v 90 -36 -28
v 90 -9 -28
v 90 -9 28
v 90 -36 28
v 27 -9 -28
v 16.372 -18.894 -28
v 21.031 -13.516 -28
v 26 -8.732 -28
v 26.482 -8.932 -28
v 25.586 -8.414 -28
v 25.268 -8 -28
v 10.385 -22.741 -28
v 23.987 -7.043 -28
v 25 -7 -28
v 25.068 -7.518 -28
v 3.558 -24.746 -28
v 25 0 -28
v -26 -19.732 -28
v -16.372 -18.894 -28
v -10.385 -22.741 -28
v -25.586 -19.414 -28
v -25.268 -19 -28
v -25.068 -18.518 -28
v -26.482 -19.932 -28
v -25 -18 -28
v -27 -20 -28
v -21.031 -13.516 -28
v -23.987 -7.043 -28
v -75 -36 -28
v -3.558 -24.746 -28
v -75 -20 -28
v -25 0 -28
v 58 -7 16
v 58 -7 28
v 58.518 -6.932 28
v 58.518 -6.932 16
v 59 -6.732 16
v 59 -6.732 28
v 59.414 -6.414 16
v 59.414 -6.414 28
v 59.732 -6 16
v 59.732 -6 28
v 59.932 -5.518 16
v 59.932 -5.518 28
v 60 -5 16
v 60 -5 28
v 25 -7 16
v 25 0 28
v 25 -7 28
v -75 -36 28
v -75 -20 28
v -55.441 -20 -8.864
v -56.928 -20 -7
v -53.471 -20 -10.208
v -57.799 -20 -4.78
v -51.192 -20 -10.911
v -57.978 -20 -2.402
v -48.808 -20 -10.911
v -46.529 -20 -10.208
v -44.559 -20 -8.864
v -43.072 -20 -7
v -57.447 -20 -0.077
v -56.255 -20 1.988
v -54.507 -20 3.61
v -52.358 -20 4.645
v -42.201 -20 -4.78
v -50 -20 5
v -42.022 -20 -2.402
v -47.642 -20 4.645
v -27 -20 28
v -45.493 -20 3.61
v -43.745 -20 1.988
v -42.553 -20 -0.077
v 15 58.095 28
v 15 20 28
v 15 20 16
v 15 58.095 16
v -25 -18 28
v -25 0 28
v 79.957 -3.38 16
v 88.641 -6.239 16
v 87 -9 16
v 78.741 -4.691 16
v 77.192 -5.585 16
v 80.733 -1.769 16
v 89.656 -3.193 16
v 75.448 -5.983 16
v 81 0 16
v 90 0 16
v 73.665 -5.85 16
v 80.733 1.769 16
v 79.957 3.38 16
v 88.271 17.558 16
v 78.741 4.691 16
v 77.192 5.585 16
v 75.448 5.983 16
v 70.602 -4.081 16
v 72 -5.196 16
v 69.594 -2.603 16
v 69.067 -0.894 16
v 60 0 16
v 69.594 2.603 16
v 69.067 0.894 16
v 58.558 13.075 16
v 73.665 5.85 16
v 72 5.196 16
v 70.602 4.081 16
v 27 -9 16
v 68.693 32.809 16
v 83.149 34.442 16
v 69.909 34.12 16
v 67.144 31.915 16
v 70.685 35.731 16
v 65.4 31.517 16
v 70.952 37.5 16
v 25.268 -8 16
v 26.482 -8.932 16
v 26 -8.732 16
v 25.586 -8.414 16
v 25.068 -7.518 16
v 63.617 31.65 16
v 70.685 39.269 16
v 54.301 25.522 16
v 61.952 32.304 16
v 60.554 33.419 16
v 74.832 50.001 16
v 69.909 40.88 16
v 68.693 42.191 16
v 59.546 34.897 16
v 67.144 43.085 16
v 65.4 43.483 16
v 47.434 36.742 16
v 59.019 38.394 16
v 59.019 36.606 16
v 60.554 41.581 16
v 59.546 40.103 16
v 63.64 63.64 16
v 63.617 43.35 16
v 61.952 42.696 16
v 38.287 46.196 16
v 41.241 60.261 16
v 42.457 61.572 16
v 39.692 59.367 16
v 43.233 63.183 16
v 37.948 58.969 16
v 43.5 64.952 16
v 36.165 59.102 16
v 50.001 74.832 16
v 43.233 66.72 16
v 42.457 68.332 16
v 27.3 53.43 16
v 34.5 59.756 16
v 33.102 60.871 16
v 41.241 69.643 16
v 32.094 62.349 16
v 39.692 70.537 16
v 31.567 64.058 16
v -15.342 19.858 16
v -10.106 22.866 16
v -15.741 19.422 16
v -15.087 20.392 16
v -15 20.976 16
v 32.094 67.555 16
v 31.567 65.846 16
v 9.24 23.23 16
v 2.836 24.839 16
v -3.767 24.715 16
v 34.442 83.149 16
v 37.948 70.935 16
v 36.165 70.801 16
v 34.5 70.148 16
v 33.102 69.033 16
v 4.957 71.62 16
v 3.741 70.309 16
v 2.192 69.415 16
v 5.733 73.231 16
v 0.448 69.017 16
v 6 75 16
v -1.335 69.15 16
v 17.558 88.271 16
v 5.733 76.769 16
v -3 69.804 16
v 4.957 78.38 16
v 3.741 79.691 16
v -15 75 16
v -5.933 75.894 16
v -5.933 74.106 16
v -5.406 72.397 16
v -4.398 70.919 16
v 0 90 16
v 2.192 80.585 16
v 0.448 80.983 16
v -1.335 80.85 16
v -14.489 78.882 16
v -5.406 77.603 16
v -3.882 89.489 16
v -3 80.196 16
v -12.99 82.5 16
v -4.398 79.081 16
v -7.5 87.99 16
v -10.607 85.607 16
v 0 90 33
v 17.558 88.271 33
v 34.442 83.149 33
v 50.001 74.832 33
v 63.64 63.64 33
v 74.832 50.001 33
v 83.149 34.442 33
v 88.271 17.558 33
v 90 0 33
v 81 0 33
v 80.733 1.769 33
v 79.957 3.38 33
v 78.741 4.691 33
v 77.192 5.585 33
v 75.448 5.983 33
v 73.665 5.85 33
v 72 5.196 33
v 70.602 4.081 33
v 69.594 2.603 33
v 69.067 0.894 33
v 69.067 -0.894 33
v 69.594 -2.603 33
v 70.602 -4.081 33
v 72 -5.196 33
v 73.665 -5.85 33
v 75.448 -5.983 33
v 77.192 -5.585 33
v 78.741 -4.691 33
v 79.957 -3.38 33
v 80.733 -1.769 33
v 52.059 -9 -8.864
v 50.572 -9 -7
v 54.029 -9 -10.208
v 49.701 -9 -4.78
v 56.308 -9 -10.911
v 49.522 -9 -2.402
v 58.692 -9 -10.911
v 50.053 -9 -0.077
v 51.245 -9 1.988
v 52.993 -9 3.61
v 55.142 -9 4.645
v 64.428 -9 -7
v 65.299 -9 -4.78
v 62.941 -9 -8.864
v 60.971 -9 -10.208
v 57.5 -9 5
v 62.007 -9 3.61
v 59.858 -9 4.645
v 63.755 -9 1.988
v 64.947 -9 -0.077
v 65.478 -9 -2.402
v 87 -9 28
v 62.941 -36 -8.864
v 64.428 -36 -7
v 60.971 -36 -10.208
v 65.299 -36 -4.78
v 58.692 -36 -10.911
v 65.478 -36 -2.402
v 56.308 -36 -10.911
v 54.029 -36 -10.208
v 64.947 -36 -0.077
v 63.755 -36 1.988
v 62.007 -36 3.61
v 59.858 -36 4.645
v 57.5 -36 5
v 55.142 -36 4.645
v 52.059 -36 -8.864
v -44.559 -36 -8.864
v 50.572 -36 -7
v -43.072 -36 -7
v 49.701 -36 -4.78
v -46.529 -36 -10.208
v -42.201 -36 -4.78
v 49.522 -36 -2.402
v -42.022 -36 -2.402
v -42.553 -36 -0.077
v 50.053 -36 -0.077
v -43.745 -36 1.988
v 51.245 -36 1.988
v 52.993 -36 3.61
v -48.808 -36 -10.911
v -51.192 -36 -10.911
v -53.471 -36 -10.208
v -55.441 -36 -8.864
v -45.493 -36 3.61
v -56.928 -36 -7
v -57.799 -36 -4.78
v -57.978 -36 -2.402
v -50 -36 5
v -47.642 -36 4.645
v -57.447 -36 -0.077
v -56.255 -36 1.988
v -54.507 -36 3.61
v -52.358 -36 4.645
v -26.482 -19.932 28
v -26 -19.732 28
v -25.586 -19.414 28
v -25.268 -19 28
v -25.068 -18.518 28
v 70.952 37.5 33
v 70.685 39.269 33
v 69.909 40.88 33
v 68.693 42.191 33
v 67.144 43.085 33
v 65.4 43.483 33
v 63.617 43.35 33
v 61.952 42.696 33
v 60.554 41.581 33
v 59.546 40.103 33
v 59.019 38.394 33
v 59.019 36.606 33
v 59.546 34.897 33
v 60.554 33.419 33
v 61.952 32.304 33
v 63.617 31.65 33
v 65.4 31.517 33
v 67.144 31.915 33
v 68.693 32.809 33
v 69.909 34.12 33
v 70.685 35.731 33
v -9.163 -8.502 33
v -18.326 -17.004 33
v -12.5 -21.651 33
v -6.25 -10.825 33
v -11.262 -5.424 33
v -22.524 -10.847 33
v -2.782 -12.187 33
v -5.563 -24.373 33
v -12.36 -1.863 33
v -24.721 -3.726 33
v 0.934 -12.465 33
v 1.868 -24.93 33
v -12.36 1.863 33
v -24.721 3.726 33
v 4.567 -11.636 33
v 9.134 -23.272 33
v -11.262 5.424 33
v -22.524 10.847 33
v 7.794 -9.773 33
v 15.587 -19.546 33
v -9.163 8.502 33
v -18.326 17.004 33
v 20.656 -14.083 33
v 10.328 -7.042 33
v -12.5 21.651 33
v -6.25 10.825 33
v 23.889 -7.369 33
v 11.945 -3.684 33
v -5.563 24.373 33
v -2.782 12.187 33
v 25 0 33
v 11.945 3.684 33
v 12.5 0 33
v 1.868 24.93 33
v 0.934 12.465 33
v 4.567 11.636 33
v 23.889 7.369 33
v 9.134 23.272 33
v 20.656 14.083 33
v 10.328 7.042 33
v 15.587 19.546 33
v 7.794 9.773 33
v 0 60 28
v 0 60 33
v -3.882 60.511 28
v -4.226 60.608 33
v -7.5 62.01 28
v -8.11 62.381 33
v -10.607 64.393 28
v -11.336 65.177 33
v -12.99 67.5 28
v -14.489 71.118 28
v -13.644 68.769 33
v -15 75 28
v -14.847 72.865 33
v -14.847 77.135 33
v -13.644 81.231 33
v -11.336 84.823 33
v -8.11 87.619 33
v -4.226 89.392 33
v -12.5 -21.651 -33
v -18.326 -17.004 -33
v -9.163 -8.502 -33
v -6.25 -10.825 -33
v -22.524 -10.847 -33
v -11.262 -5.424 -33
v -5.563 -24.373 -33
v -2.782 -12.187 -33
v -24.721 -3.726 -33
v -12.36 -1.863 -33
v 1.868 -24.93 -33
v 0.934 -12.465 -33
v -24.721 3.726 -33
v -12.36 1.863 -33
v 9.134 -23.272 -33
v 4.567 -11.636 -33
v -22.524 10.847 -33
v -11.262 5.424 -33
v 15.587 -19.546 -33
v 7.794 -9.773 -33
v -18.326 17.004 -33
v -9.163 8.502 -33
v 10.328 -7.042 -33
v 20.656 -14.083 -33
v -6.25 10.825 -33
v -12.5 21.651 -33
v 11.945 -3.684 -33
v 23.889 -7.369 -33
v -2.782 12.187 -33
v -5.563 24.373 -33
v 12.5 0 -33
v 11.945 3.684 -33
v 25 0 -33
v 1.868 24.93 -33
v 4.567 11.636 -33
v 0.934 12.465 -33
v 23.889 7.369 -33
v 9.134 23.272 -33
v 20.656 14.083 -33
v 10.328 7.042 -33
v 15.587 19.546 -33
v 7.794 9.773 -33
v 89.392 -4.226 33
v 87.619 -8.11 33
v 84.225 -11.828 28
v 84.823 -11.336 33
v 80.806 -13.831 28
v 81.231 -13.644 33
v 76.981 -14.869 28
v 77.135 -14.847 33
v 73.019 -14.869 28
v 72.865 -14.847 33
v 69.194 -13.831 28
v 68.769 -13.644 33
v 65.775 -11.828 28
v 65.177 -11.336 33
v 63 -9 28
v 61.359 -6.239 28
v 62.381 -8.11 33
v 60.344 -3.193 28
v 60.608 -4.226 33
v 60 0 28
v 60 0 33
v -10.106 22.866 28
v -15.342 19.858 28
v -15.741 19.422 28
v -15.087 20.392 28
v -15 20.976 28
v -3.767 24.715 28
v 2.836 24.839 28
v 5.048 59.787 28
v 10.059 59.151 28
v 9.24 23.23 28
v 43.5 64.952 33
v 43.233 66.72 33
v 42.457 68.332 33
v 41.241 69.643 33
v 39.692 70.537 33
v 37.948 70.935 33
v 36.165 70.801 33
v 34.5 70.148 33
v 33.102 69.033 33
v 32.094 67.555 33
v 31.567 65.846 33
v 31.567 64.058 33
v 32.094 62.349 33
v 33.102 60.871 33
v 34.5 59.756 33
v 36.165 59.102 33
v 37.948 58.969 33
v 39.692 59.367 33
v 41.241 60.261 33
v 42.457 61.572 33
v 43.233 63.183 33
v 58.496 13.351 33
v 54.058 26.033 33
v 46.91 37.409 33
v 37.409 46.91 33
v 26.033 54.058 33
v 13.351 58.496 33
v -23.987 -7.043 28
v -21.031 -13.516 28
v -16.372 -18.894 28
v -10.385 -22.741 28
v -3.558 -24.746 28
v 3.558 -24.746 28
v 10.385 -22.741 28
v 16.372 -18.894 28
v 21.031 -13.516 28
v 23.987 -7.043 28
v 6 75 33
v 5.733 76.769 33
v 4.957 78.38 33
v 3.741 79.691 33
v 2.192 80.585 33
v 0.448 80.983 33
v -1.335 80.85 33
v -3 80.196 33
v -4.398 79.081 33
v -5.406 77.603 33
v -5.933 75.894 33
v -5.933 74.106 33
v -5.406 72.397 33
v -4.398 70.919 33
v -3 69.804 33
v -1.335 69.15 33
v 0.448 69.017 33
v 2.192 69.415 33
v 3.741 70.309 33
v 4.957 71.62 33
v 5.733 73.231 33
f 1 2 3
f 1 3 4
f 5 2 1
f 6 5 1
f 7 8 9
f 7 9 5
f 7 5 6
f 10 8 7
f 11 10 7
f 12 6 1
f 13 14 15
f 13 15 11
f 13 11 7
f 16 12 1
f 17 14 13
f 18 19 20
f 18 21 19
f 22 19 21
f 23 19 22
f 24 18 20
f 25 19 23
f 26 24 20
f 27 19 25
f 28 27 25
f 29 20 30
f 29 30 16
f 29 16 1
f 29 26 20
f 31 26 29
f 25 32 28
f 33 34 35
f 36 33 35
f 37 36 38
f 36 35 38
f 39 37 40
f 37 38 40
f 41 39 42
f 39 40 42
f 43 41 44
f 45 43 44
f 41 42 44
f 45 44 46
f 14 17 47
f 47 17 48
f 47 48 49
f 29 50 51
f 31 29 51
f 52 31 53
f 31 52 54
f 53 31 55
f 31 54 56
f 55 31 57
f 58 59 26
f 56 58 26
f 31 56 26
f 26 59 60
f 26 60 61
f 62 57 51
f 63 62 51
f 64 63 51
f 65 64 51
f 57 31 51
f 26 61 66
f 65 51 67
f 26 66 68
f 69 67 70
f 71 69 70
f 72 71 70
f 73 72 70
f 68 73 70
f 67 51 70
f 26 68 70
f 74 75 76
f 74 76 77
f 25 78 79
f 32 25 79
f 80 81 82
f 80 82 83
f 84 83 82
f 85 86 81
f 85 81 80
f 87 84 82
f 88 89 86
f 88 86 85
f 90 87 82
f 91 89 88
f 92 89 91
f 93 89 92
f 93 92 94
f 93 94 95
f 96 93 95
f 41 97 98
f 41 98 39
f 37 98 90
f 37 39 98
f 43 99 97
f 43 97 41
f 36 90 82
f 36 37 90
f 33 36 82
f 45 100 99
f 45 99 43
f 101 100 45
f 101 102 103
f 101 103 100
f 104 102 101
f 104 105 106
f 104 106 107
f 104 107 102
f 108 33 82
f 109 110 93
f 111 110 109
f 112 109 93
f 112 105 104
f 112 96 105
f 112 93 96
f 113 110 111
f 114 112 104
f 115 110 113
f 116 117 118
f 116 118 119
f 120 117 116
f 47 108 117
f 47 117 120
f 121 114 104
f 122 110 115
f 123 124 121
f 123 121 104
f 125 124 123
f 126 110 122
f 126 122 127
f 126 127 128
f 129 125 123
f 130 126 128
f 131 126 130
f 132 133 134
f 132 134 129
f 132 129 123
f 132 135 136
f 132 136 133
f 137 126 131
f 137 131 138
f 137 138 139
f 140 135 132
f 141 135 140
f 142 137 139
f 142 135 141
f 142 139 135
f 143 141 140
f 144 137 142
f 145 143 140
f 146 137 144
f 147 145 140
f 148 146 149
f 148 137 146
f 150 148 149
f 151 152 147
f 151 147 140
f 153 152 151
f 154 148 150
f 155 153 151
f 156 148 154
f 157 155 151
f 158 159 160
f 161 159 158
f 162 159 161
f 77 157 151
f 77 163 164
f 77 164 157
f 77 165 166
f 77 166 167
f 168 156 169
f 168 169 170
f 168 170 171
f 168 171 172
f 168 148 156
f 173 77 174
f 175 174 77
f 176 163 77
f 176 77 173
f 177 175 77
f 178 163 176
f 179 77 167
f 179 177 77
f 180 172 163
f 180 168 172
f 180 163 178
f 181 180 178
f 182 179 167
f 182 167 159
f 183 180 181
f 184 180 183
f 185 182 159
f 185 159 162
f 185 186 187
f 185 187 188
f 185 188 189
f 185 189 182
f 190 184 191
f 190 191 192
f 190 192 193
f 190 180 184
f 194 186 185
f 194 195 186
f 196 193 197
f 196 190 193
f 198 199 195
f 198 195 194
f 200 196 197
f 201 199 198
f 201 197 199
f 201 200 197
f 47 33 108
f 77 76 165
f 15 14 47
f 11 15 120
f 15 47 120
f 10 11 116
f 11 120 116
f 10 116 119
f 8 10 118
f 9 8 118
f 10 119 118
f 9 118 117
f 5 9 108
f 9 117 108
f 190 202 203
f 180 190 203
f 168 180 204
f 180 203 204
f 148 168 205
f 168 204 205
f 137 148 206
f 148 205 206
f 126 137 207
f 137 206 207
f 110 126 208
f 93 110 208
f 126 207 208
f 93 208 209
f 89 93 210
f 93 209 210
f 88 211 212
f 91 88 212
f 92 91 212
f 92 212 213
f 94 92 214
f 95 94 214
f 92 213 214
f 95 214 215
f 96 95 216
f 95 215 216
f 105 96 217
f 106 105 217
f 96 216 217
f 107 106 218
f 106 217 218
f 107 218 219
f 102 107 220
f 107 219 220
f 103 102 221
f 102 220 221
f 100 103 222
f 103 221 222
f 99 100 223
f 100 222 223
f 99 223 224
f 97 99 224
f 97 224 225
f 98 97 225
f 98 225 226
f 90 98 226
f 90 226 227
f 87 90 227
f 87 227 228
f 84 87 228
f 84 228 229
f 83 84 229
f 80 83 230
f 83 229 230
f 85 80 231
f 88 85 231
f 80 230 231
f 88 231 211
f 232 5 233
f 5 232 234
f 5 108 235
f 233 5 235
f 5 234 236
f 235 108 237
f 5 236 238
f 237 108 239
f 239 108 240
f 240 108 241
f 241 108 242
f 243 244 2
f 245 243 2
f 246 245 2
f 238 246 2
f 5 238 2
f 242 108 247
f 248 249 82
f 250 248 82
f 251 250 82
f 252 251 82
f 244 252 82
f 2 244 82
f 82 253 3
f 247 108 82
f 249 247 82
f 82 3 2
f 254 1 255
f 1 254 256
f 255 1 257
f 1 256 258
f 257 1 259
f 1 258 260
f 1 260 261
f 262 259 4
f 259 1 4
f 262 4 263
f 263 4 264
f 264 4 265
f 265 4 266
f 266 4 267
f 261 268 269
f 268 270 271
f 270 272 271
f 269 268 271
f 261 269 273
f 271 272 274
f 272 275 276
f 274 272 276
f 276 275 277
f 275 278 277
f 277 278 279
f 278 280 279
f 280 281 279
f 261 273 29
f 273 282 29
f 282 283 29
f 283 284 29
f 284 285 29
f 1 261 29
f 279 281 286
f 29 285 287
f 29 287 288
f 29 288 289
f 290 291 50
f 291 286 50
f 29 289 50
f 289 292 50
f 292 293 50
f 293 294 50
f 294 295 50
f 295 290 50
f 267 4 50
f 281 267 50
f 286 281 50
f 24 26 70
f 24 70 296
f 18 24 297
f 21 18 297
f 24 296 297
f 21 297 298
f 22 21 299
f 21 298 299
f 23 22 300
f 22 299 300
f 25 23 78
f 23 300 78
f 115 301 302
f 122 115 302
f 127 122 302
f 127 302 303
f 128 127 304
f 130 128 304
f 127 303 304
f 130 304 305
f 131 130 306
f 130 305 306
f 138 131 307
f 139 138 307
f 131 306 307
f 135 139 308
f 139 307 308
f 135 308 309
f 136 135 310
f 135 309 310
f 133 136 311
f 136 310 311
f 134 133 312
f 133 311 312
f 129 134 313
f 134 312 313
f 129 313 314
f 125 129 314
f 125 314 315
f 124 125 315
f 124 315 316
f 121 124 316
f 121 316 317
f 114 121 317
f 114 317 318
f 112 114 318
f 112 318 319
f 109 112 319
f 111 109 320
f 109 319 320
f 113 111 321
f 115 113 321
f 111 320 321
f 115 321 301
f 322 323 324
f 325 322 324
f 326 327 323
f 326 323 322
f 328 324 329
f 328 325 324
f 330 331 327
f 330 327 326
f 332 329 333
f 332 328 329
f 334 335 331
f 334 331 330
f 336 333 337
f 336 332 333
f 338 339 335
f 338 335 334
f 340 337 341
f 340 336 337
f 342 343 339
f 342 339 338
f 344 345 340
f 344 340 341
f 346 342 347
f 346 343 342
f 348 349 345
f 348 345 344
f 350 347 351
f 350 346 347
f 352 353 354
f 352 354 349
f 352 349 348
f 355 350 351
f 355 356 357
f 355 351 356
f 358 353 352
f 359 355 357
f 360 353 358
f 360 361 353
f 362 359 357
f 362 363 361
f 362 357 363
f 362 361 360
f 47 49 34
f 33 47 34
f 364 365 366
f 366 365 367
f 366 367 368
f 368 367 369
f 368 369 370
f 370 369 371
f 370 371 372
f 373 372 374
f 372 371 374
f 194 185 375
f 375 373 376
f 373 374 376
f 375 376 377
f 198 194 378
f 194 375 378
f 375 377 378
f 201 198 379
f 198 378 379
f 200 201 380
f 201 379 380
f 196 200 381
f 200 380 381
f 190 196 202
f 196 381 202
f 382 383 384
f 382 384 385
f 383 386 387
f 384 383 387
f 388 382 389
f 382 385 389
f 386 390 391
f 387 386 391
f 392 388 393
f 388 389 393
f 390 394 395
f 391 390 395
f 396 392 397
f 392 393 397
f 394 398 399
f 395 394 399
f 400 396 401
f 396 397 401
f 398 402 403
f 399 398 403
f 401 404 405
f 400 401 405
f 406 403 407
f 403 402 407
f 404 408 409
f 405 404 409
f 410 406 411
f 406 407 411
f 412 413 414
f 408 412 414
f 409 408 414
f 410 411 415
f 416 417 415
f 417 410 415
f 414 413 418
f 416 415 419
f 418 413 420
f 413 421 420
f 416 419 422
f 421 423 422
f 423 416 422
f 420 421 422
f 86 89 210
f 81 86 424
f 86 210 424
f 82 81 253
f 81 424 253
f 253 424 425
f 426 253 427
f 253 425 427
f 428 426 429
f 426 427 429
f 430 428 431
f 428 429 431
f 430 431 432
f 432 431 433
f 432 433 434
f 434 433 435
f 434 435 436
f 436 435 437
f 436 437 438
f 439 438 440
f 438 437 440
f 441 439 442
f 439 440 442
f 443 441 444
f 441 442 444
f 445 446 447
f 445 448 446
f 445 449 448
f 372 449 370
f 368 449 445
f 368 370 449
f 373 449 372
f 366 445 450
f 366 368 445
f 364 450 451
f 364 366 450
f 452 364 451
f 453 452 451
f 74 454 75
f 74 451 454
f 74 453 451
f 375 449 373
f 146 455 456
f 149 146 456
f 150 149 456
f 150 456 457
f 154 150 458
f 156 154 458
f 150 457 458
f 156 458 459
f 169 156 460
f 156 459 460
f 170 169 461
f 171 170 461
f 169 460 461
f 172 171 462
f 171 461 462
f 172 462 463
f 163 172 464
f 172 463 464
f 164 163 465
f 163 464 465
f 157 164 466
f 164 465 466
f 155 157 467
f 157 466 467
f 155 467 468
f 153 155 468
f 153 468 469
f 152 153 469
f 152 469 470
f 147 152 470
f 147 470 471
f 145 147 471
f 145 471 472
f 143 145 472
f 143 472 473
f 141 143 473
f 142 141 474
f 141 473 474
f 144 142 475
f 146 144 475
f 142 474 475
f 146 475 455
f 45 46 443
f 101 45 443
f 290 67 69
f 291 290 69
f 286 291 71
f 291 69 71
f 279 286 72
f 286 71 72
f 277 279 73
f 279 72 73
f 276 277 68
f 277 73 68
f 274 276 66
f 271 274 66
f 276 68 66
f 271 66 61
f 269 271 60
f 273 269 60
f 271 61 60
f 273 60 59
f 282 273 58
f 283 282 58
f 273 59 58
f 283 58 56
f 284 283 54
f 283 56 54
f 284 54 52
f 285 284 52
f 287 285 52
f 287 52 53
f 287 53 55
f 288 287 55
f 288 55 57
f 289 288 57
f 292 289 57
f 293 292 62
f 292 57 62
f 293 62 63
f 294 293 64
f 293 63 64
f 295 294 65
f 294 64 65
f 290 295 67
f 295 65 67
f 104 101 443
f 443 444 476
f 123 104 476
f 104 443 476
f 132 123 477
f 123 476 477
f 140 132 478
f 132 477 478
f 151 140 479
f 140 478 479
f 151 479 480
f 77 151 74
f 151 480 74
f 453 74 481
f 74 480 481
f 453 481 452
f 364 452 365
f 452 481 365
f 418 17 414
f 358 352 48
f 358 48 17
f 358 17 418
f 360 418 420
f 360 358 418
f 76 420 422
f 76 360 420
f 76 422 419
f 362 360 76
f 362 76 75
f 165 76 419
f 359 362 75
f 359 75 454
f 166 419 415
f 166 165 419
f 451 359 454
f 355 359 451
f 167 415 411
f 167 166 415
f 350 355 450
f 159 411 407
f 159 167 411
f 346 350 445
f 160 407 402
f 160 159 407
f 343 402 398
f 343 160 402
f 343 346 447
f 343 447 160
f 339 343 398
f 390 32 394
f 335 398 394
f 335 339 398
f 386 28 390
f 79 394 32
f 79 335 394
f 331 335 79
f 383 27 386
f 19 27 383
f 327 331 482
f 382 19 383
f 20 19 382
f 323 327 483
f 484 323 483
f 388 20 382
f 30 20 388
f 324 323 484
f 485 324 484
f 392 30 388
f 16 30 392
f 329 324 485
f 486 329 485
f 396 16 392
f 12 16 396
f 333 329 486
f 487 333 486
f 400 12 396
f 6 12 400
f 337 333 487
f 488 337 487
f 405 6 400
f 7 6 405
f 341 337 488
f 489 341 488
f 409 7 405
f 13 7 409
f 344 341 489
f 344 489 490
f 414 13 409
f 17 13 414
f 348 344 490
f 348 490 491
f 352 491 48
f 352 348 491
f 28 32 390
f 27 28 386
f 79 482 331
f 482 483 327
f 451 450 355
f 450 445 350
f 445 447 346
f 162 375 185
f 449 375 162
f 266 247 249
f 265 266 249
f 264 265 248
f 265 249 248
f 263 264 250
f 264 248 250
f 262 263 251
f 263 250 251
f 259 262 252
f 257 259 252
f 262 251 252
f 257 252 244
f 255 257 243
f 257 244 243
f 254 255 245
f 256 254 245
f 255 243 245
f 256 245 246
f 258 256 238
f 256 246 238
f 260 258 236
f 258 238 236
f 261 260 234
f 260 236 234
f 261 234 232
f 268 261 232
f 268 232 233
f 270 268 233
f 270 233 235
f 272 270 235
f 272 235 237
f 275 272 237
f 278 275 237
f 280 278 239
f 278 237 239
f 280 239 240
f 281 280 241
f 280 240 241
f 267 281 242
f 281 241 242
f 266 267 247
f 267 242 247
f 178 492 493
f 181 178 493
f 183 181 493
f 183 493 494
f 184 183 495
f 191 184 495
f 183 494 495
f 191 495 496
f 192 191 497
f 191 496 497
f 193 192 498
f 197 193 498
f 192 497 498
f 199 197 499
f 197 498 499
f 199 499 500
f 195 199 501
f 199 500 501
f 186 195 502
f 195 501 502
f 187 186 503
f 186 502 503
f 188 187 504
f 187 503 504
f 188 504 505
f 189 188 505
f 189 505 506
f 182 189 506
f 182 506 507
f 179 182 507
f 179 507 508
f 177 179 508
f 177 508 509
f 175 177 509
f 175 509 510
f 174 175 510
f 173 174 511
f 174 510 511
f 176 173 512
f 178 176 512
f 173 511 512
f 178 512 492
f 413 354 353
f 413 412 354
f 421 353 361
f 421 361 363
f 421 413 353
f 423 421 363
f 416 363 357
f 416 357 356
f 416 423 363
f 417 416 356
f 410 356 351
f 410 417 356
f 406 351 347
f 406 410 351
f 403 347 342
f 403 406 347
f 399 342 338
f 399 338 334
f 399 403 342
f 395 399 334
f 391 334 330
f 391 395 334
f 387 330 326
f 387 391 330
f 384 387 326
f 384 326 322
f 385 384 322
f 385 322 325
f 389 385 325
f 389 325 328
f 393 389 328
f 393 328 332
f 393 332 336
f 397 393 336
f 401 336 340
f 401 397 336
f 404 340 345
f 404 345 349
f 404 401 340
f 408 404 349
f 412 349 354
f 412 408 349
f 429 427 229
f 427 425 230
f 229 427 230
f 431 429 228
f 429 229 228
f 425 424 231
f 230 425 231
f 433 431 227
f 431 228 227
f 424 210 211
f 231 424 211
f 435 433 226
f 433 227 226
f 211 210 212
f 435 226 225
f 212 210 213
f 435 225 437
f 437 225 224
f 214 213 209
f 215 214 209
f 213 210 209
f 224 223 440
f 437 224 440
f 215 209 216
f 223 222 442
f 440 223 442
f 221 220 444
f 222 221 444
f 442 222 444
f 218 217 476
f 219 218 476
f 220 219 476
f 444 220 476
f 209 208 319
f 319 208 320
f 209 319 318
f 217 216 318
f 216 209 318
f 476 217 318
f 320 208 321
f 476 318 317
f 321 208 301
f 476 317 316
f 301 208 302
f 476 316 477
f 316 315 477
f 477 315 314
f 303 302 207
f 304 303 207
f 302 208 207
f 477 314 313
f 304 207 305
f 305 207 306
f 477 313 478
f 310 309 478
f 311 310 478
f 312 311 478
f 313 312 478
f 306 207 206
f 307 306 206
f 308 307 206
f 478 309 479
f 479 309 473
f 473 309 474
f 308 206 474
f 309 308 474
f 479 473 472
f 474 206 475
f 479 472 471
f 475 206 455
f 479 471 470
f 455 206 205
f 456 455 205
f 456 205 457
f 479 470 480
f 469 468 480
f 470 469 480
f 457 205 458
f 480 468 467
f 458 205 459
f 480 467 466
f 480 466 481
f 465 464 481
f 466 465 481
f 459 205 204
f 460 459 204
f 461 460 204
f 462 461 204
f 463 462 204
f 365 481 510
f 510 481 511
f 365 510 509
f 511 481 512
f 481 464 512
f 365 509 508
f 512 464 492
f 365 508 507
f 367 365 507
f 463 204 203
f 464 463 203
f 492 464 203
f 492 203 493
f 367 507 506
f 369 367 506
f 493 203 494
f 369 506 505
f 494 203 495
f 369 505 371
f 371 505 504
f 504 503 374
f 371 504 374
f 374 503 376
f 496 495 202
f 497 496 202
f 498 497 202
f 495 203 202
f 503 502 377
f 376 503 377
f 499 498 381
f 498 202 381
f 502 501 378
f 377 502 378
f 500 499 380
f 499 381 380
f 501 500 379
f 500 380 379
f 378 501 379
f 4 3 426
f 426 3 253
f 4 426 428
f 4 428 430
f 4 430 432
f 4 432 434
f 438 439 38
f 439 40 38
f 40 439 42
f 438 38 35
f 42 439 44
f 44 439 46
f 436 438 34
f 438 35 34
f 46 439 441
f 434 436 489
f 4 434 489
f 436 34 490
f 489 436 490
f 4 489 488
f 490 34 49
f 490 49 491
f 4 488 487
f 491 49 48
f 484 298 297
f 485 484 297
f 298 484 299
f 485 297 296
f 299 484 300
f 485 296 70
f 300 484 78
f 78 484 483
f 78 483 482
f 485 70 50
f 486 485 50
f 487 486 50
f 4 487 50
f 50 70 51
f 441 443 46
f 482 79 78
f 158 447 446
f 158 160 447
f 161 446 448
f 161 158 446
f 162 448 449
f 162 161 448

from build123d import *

# Parameters (mm, degrees)
SKETCH10_R           = 25
SKETCH10_R_2         = 12.5
BOSS_EXTRUDE7_DEPTH  = 33
BOSS_EXTRUDE9_START  = 5
BOSS_EXTRUDE9_DEPTH  = 56
SKETCH13_R           = 8
CUT_EXTRUDE1_DEPTH   = 16
BOSS_EXTRUDE12_DEPTH = 17
SKETCH17_R           = 6
CUT_EXTRUDE2_DEPTH   = 17
BOSS_EXTRUDE13_DEPTH = 12
SKETCH20_R           = 8
CUT_EXTRUDE3_DEPTH   = 27
FILLET1_R            = 2


with BuildPart() as part:
    # Sketch10 → Boss-Extrude7 (new, symmetric)
    with BuildSketch(Plane.XY):
        Circle(SKETCH10_R)
        Circle(SKETCH10_R_2, mode=Mode.SUBTRACT)
    extrude(amount=BOSS_EXTRUDE7_DEPTH, both=True)



with BuildPart() as body_2:
    # Sketch12 → Boss-Extrude9 (new body)
    with BuildSketch(Plane(origin=(0, 0, 33), x_dir=(-1, 0, 0), z_dir=(0, 0, -1)).offset(BOSS_EXTRUDE9_START)):
        with BuildLine():
            Line((0, -36), (75, -36))
            Line((75, -36), (75, -20))
            Line((75, -20), (27, -20))
            ThreePointArc((27, -20), (25.585786438, -19.414213562), (25, -18))
            Line((25, -18), (25, 0))
            ThreePointArc((25, 0), (0, -25), (-25, 0))
            Line((-25, 0), (-25, -7))
            ThreePointArc((-25, -7), (-25.585786438, -8.414213562), (-27, -9))
            Line((-27, -9), (-90, -9))
            Line((-90, -9), (-90, -36))
            Line((-90, -36), (0, -36))
        make_face()
    extrude(amount=BOSS_EXTRUDE9_DEPTH)

    # Sketch13 → Cut-Extrude1 (cut)
    with BuildSketch(Plane(origin=(0, -20, 0), x_dir=(1, 0, 0), z_dir=(0, 1, 0))):
        with Locations(Location((-50, 3, 0), (0, 0, 270))):
            Circle(SKETCH13_R)
    extrude(amount=-CUT_EXTRUDE1_DEPTH, mode=Mode.SUBTRACT)


with BuildPart() as body_3:
    # Sketch15 → Boss-Extrude12 (new body)
    with BuildSketch(Plane.XY.offset(33)):
        with BuildLine():
            ThreePointArc((60, 0), (42.426406871, 42.426406871), (0, 60))
            ThreePointArc((0, 60), (-15, 75), (0, 90))
            ThreePointArc((0, 90), (63.639610307, 63.639610307), (90, 0))
            ThreePointArc((90, 0), (75, -15), (60, 0))
        make_face()
    extrude(amount=-BOSS_EXTRUDE12_DEPTH)

    # Sketch17 → Cut-Extrude2 (cut)
    with BuildSketch(Plane.XY.offset(33)):
        with Locations((0, 75)):
            Circle(SKETCH17_R)
        with Locations((37.5, 64.951905284)):
            Circle(SKETCH17_R)
        with Locations((64.951905284, 37.5)):
            Circle(SKETCH17_R)
        with Locations((75, 0)):
            Circle(SKETCH17_R)
    extrude(amount=-CUT_EXTRUDE2_DEPTH, mode=Mode.SUBTRACT)


with BuildPart() as part_1:
    add(part.part)

    add(body_2.part)  # Boss-Extrude13 merges body 2

    add(body_3.part)  # Boss-Extrude13 merges body 3
    # Sketch18 → Boss-Extrude13 (add)
    with BuildSketch(Plane.XY.offset(28)):
        with BuildLine():
            Line((25, -7), (58, -7))
            ThreePointArc((58, -7), (59.414213562, -6.414213562), (60, -5))
            Line((60, -5), (60, 0))
            ThreePointArc((60, 0), (60.769750529, -4.74341649), (63, -9))
            Line((63, -9), (27, -9))
            ThreePointArc((27, -9), (25.585786438, -8.414213562), (25, -7))
        make_face()
        with BuildLine():
            Line((-15, 75), (-15, 20))
            ThreePointArc((-15, 20), (0, 25), (15, 20))
            Line((15, 20), (15, 58.094750193))
            ThreePointArc((15, 58.094750193), (7.560257549, 59.521781776), (0, 60))
            ThreePointArc((0, 60), (-10.606601718, 64.393398282), (-15, 75))
        make_face()
    extrude(amount=-BOSS_EXTRUDE13_DEPTH)

    # Sketch20 → Cut-Extrude3 (cut)
    with BuildSketch(Plane(origin=(0, -9, 0), x_dir=(1, 0, 0), z_dir=(0, 1, 0))):
        with Locations(Location((57.5, 3, 0), (0, 0, 270))):
            Circle(SKETCH20_R)
    extrude(amount=-CUT_EXTRUDE3_DEPTH, mode=Mode.SUBTRACT)

    # Fillet1
    fillet1_edges = [part_1.edges().sort_by_distance(p)[0] for p in [
        (-15, 20, 22),
    ]]
    fillet(fillet1_edges, radius=FILLET1_R)


solid = part_1.part
